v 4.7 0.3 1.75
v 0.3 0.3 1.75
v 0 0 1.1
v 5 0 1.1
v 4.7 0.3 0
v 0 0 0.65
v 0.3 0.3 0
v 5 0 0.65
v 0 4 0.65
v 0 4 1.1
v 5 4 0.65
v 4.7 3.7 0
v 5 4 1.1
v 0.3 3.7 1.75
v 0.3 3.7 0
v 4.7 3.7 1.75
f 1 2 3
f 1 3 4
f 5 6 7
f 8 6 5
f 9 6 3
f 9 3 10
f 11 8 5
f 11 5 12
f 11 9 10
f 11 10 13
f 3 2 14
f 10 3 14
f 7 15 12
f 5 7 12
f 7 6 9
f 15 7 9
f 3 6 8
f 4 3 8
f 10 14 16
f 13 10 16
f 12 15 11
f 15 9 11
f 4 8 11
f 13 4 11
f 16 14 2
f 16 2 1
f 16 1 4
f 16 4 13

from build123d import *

# Parameters (mm, degrees)
ESQUISSE1_W        = 5
ESQUISSE1_H        = 4
BOSS_EXTRU_1_DEPTH = 1.75
CHANFREIN1_SIZE    = 0.65
CHANFREIN1_SIZE2   = 0.3
CHANFREIN2_SIZE    = 0.3
CHANFREIN2_SIZE2   = 0.65
CHANFREIN3_SIZE    = 0.65
CHANFREIN3_SIZE2   = 0.3
CHANFREIN4_SIZE    = 0.3
CHANFREIN4_SIZE2   = 0.65
CHANFREIN5_SIZE    = 0.65
CHANFREIN5_SIZE2   = 0.3
CHANFREIN6_SIZE    = 0.3
CHANFREIN6_SIZE2   = 0.65
CHANFREIN7_SIZE    = 0.65
CHANFREIN7_SIZE2   = 0.3
CHANFREIN8_SIZE    = 0.3
CHANFREIN8_SIZE2   = 0.65


with BuildPart() as part:
    # Esquisse1 → Boss.-Extru.1 (new body)
    with BuildSketch(Plane.XY):
        with Locations((2.5, 2)):
            Rectangle(ESQUISSE1_W, ESQUISSE1_H)
    extrude(amount=BOSS_EXTRU_1_DEPTH)

    # Chanfrein1
    chanfrein1_edges = [part.edges().sort_by_distance(p)[0] for p in [
        (2.5, 0, 1.75),
    ]]
    chanfrein1_side = [part.faces().sort_by_distance(p)[0] for p in [
        (2.5, 0, 0.875),
    ]]
    chamfer(chanfrein1_edges, length=CHANFREIN1_SIZE, length2=CHANFREIN1_SIZE2, reference=chanfrein1_side[0])

    # Chanfrein2
    chanfrein2_edges = [part.edges().sort_by_distance(p)[0] for p in [
        (2.5, 0, 0),
    ]]
    chanfrein2_side = [part.faces().sort_by_distance(p)[0] for p in [
        (2.5, 2, 0),
    ]]
    chamfer(chanfrein2_edges, length=CHANFREIN2_SIZE, length2=CHANFREIN2_SIZE2, reference=chanfrein2_side[0])

    # Chanfrein3
    chanfrein3_edges = [part.edges().sort_by_distance(p)[0] for p in [
        (2.5, 4, 1.75),
    ]]
    chanfrein3_side = [part.faces().sort_by_distance(p)[0] for p in [
        (2.5, 4, 0.875),
    ]]
    chamfer(chanfrein3_edges, length=CHANFREIN3_SIZE, length2=CHANFREIN3_SIZE2, reference=chanfrein3_side[0])

    # Chanfrein4
    chanfrein4_edges = [part.edges().sort_by_distance(p)[0] for p in [
        (2.5, 4, 0),
    ]]
    chanfrein4_side = [part.faces().sort_by_distance(p)[0] for p in [
        (2.5, 2.15, 0),
    ]]
    chamfer(chanfrein4_edges, length=CHANFREIN4_SIZE, length2=CHANFREIN4_SIZE2, reference=chanfrein4_side[0])

    # Chanfrein5
    chanfrein5_edges = [part.edges().sort_by_distance(p)[0] for p in [
        (0, 2, 1.75),
    ]]
    chanfrein5_side = [part.faces().sort_by_distance(p)[0] for p in [
        (0, 2, 0.875),
    ]]
    chamfer(chanfrein5_edges, length=CHANFREIN5_SIZE, length2=CHANFREIN5_SIZE2, reference=chanfrein5_side[0])

    # Chanfrein6
    chanfrein6_edges = [part.edges().sort_by_distance(p)[0] for p in [
        (0, 2, 0),
    ]]
    chanfrein6_side = [part.faces().sort_by_distance(p)[0] for p in [
        (2.5, 2, 0),
    ]]
    chamfer(chanfrein6_edges, length=CHANFREIN6_SIZE, length2=CHANFREIN6_SIZE2, reference=chanfrein6_side[0])

    # Chanfrein7
    chanfrein7_edges = [part.edges().sort_by_distance(p)[0] for p in [
        (5, 2, 1.75),
    ]]
    chanfrein7_side = [part.faces().sort_by_distance(p)[0] for p in [
        (5, 2, 0.875),
    ]]
    chamfer(chanfrein7_edges, length=CHANFREIN7_SIZE, length2=CHANFREIN7_SIZE2, reference=chanfrein7_side[0])

    # Chanfrein8
    chanfrein8_edges = [part.edges().sort_by_distance(p)[0] for p in [
        (5, 2, 0),
    ]]
    chanfrein8_side = [part.faces().sort_by_distance(p)[0] for p in [
        (2.65, 2, 0),
    ]]
    chamfer(chanfrein8_edges, length=CHANFREIN8_SIZE, length2=CHANFREIN8_SIZE2, reference=chanfrein8_side[0])


solid = part.part
